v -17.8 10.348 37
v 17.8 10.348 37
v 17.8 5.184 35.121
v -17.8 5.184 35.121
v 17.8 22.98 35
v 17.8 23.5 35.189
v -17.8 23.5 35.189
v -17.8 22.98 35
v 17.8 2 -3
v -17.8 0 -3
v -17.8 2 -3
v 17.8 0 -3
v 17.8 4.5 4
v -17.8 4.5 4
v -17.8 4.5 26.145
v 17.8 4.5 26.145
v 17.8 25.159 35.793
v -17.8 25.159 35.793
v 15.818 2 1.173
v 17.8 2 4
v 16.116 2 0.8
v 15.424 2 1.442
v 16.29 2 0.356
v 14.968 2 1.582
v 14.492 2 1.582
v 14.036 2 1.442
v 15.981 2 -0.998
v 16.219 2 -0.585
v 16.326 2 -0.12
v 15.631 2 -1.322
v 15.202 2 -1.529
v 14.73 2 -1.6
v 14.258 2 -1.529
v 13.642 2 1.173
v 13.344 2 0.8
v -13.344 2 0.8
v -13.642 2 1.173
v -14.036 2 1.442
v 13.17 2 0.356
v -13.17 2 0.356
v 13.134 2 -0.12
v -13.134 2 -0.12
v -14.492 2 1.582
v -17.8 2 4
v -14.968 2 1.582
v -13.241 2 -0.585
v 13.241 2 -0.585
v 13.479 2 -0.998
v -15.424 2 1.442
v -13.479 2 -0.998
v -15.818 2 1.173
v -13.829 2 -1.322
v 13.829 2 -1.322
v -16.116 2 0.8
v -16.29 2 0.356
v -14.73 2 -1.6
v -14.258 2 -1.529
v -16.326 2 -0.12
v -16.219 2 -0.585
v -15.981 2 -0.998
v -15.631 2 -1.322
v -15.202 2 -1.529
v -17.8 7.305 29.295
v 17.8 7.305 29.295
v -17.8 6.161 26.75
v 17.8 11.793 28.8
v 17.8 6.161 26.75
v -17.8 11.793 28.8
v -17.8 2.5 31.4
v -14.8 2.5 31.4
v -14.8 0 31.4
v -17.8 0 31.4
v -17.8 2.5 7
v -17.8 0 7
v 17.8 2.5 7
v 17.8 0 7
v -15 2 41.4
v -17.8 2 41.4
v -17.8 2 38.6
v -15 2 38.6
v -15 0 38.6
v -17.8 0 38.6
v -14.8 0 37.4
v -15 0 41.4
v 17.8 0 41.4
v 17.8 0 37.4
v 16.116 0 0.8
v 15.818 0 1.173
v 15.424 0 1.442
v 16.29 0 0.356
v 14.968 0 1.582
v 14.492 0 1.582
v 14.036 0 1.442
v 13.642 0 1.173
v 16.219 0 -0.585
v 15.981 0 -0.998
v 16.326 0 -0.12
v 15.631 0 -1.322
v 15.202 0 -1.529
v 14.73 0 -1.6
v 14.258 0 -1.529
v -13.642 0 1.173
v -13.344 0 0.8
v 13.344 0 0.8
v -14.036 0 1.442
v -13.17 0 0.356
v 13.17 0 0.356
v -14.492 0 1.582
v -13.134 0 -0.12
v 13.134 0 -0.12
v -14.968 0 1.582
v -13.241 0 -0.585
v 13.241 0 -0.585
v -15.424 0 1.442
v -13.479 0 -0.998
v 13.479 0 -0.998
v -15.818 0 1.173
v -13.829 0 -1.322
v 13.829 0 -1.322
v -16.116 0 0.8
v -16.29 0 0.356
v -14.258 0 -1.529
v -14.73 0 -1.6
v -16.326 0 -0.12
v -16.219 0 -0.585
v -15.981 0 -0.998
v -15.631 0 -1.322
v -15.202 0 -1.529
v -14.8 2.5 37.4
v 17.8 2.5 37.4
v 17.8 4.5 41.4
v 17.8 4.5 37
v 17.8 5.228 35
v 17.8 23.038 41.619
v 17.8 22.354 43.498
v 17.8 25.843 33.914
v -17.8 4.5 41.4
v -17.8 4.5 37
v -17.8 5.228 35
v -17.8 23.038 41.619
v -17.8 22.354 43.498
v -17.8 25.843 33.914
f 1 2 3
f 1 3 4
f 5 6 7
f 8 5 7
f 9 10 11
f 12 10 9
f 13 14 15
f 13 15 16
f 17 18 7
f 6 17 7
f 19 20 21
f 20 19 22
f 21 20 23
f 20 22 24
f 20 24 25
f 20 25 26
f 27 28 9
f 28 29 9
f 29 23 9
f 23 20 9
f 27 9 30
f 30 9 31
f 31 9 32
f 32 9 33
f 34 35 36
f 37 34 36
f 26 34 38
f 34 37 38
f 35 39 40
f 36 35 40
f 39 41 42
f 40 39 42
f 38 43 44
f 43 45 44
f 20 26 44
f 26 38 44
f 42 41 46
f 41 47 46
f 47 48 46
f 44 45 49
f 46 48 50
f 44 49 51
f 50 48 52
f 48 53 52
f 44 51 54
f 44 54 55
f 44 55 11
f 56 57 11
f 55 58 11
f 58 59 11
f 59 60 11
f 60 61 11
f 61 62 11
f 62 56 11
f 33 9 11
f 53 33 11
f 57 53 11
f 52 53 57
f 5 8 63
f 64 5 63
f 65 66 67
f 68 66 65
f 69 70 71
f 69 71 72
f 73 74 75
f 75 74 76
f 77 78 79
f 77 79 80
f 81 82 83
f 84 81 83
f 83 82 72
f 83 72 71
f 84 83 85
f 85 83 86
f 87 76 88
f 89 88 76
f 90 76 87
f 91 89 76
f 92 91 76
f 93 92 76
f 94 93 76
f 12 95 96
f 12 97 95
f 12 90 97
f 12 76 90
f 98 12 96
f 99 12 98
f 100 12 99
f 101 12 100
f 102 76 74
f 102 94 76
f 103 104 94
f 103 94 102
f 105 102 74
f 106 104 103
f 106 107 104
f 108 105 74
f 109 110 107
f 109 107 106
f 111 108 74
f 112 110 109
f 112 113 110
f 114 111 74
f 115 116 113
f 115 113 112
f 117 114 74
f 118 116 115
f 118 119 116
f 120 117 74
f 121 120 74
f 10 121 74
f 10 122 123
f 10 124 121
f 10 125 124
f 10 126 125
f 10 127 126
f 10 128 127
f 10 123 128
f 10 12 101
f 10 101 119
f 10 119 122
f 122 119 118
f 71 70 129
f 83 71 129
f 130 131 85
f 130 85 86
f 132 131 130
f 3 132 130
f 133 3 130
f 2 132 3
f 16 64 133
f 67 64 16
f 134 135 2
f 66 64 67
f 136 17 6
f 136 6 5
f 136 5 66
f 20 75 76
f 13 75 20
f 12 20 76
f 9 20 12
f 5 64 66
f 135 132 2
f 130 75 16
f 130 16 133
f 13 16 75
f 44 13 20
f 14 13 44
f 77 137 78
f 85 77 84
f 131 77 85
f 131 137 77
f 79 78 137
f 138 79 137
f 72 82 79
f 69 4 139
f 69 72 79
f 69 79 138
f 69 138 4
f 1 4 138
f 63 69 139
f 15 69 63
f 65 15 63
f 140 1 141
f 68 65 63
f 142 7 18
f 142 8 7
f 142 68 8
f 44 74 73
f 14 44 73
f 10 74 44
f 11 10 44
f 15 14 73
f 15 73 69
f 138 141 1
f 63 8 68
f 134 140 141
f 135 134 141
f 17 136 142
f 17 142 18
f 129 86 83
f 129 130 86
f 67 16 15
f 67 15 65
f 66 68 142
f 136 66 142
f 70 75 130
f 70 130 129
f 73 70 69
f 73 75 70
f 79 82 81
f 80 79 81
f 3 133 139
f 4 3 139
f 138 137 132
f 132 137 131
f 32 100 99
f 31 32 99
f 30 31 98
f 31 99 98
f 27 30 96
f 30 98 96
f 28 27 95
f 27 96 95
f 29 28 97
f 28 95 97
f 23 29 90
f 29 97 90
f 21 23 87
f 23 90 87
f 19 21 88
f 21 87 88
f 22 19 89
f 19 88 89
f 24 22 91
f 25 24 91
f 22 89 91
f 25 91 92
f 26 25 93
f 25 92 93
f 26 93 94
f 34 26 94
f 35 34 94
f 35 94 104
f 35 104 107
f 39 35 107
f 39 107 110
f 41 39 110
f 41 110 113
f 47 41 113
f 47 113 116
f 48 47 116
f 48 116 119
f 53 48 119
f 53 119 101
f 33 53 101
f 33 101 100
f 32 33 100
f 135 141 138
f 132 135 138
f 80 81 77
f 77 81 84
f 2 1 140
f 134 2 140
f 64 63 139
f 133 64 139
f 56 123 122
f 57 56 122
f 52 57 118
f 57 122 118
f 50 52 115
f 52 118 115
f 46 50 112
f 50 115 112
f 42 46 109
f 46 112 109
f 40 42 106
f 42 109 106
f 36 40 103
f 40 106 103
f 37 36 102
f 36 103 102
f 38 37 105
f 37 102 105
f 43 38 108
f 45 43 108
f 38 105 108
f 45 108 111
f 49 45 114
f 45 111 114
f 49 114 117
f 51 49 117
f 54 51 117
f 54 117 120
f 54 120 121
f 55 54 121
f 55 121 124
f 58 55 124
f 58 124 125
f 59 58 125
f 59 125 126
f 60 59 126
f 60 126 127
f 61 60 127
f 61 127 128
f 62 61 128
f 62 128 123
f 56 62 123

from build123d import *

# Parameters (mm, degrees)
SKETCH1_R           = 1.4
BOSS_EXTRUDE1_DEPTH = 2
SKETCH2_W           = 35.6
SKETCH2_H           = 4
BOSS_EXTRUDE2_DEPTH = 2.5
SKETCH3_W           = 35.6
SKETCH3_H           = 2
BOSS_EXTRUDE3_DEPTH = 30
SKETCH4_W           = 3
SKETCH4_H           = 10
BOSS_EXTRUDE4_DEPTH = 2.5
SKETCH5_W           = 35.6
SKETCH5_H           = 2
BOSS_EXTRUDE5_DEPTH = 20
SKETCH6_W           = 29.6
SKETCH6_H           = 4
BOSS_EXTRUDE6_DEPTH = 2.5
SKETCH7_W           = 35.6
SKETCH7_H           = 24.5
BOSS_EXTRUDE7_DEPTH = 4.4
SKETCH8_W           = 29.6
SKETCH8_H           = 2.5
CUT_EXTRUDE1_DEPTH  = 4.4
SKETCH9_W           = 3
SKETCH9_H           = 2.5
CUT_EXTRUDE2_DEPTH  = 4.4
SKETCH10_W          = 35.6
SKETCH10_H          = 20
CUT_EXTRUDE3_DEPTH  = 4.4
SKETCH11_R          = 1.6
CUT_EXTRUDE4_DEPTH  = 10
SKETCH12_W          = 35.6
SKETCH12_H          = 2.5
CUT_EXTRUDE5_DEPTH  = 1
SKETCH13_W          = 35.6
SKETCH13_H          = 10.25
CUT_EXTRUDE6_DEPTH  = 1
SKETCH14_W          = 35.6
SKETCH14_H          = 19
BOSS_EXTRUDE8_DEPTH = 0.05
BOSS_EXTRUDE9_DEPTH = 35.6
SKETCH16_W          = 35.6
SKETCH16_H          = 16.293178749
CUT_EXTRUDE7_DEPTH  = 29
CUT_EXTRUDE8_DEPTH  = 6.2
SKETCH19_W          = 6
SKETCH19_H          = 2.5
CUT_EXTRUDE9_DEPTH  = 29
SKETCH20_W          = 2.8
SKETCH20_H          = 2.8
CUT_EXTRUDE10_DEPTH = 2


with BuildPart() as part:
    # Sketch1 → Boss-Extrude1 (new body)
    with BuildSketch(Plane(origin=(0, 0, 0), x_dir=(1, 0, 0), z_dir=(0, 1, 0))):
        Polygon((-17.8, 3), (17.8, 3), (17.8, -3), (17.8, -7), (-17.8, -7), (-17.8, -3), align=None)
        with Locations(Location((-14.73, 0, 0), (0, 0, 270))):
            Circle(SKETCH1_R, mode=Mode.SUBTRACT)
        with Locations(Location((14.73, 0, 0), (0, 0, 270))):
            Circle(SKETCH1_R, mode=Mode.SUBTRACT)
    extrude(amount=BOSS_EXTRUDE1_DEPTH)

    # Sketch2 → Boss-Extrude2 (add)
    with BuildSketch(Plane(origin=(0, 2, 0), x_dir=(1, 0, 0), z_dir=(0, 1, 0))):
        with Locations((0, -5)):
            Rectangle(SKETCH2_W, SKETCH2_H)
    extrude(amount=BOSS_EXTRUDE2_DEPTH)

    # Sketch3 → Boss-Extrude3 (add)
    with BuildSketch(Plane.XY.offset(7)):
        with Locations((0, 3.5)):
            Rectangle(SKETCH3_W, SKETCH3_H)
    extrude(amount=BOSS_EXTRUDE3_DEPTH)

    # Sketch4 → Boss-Extrude4 (add)
    with BuildSketch(Plane.XZ.offset(-2.5)):
        with Locations((-16.3, 32)):
            Rectangle(SKETCH4_W, SKETCH4_H)
        with Locations((16.3, 32)):
            Rectangle(SKETCH4_W, SKETCH4_H)
    extrude(amount=BOSS_EXTRUDE4_DEPTH)

    # Sketch5 → Boss-Extrude5 (add)
    with BuildSketch(Plane(origin=(0, 4.5, 0), x_dir=(1, 0, 0), z_dir=(0, 1, 0))):
        with Locations((0, -36)):
            Rectangle(SKETCH5_W, SKETCH5_H)
        with Locations((0, -27.75)):
            Rectangle(SKETCH5_W, SKETCH5_H)
    extrude(amount=BOSS_EXTRUDE5_DEPTH)

    # Sketch6 → Boss-Extrude6 (add)
    with BuildSketch(Plane.XZ.offset(-2.5)):
        with Locations((0, 35)):
            Rectangle(SKETCH6_W, SKETCH6_H)
    extrude(amount=BOSS_EXTRUDE6_DEPTH)

    # Sketch7 → Boss-Extrude7 (add)
    with BuildSketch(Plane.XY.offset(37)):
        with Locations((0, 12.25)):
            Rectangle(SKETCH7_W, SKETCH7_H)
    extrude(amount=BOSS_EXTRUDE7_DEPTH)

    # Sketch8 → Cut-Extrude1 (cut)
    with BuildSketch(Plane(origin=(0, 0, 33), x_dir=(-1, 0, 0), z_dir=(0, 0, -1))):
        with Locations((0, 1.25)):
            Rectangle(SKETCH8_W, SKETCH8_H)
    extrude(amount=-CUT_EXTRUDE1_DEPTH, mode=Mode.SUBTRACT)

    # Sketch9 → Cut-Extrude2 (cut)
    with BuildSketch(Plane(origin=(0, 0, 27), x_dir=(-1, 0, 0), z_dir=(0, 0, -1))):
        with Locations((-16.3, 1.25)):
            Rectangle(SKETCH9_W, SKETCH9_H)
        with Locations((16.3, 1.25)):
            Rectangle(SKETCH9_W, SKETCH9_H)
    extrude(amount=-CUT_EXTRUDE2_DEPTH, mode=Mode.SUBTRACT)

    # Sketch10 → Cut-Extrude3 (cut)
    with BuildSketch(Plane.XY.offset(41.4)):
        with Locations((0, 14.5)):
            Rectangle(SKETCH10_W, SKETCH10_H)
    extrude(amount=-CUT_EXTRUDE3_DEPTH, mode=Mode.SUBTRACT)

    # Sketch11 → Cut-Extrude4 (cut)
    with BuildSketch(Plane.XZ):
        with Locations(Location((-14.73, 0, 0), (0, 0, 270))):
            Circle(SKETCH11_R)
        with Locations(Location((14.73, 0, 0), (0, 0, 270))):
            Circle(SKETCH11_R)
    extrude(amount=-CUT_EXTRUDE4_DEPTH, mode=Mode.SUBTRACT)

    # Sketch12 → Cut-Extrude5 (cut)
    with BuildSketch(Plane(origin=(0, 0, 3), x_dir=(-1, 0, 0), z_dir=(0, 0, -1))):
        with Locations((0, 3.25)):
            Rectangle(SKETCH12_W, SKETCH12_H)
    extrude(amount=-CUT_EXTRUDE5_DEPTH, mode=Mode.SUBTRACT)

    # Sketch13 → Cut-Extrude6 (cut)
    with BuildSketch(Plane(origin=(0, 24.5, 0), x_dir=(1, 0, 0), z_dir=(0, 1, 0))):
        with Locations((0, -31.875)):
            Rectangle(SKETCH13_W, SKETCH13_H)
    extrude(amount=-CUT_EXTRUDE6_DEPTH, mode=Mode.SUBTRACT)

    # Sketch14 → Boss-Extrude8 (add)
    with BuildSketch(Plane.XY.offset(28.75)):
        with Locations((0, 14)):
            Rectangle(SKETCH14_W, SKETCH14_H)
    extrude(amount=BOSS_EXTRUDE8_DEPTH)

    # Sketch15 → Boss-Extrude9 (add)
    with BuildSketch(Plane.ZY.offset(17.8)):
        Polygon((35.120614758, 5.184040287), (41.618997482, 23.038200082), (43.498382723, 22.354159795), (37, 4.5), (34.871644455, 4.5), (26.145386721, 4.5), (27.415135268, 7.988605462), (33.913517991, 25.842765257), (35.792903233, 25.15872497), (29.29452051, 7.304565175), align=None)
    extrude(amount=-BOSS_EXTRUDE9_DEPTH)

    # Sketch16 → Cut-Extrude7 (cut)
    with BuildSketch(Plane(origin=(0, -7.876565314, 21.640685344), x_dir=(-1, 0, 0), z_dir=(0, 0.34202014332566366, -0.9396926207859103))):
        with Locations((0, 23.085226048)):
            Rectangle(SKETCH16_W, SKETCH16_H)
    extrude(amount=CUT_EXTRUDE7_DEPTH, mode=Mode.SUBTRACT)


with BuildPart() as body_2:
    # of the pieces the cut leaves, the one that is kept (cut_extrude7_keep)
    add(part.part.solids().sort_by_distance((-17.8, 0, -3))[0])

    # Sketch17 → Cut-Extrude8 (cut)
    with BuildSketch(Plane(origin=(0, -8.560605601, 23.520070585), x_dir=(1, 0, 0), z_dir=(0, -0.34202014332566366, 0.9396926207859103))):
        Polygon((-17.8, 33.565068136), (-17.8, 35.883362097), (17.8, 35.883362097), (17.8, 33.565068136), (17.8, 16.883362097), (-17.8, 16.883362097), align=None)
    extrude(amount=CUT_EXTRUDE8_DEPTH, mode=Mode.SUBTRACT)

    # Sketch19 → Cut-Extrude9 (cut)
    with BuildSketch(Plane.ZY.offset(-14.8)):
        with Locations((34.4, 1.25)):
            Rectangle(SKETCH19_W, SKETCH19_H)
    extrude(amount=-CUT_EXTRUDE9_DEPTH, mode=Mode.SUBTRACT)

    # Sketch20 → Cut-Extrude10 (cut)
    with BuildSketch(Plane.XZ):
        with Locations((-16.4, 40)):
            Rectangle(SKETCH20_W, SKETCH20_H)
    extrude(amount=-CUT_EXTRUDE10_DEPTH, mode=Mode.SUBTRACT)


solid = body_2.part
